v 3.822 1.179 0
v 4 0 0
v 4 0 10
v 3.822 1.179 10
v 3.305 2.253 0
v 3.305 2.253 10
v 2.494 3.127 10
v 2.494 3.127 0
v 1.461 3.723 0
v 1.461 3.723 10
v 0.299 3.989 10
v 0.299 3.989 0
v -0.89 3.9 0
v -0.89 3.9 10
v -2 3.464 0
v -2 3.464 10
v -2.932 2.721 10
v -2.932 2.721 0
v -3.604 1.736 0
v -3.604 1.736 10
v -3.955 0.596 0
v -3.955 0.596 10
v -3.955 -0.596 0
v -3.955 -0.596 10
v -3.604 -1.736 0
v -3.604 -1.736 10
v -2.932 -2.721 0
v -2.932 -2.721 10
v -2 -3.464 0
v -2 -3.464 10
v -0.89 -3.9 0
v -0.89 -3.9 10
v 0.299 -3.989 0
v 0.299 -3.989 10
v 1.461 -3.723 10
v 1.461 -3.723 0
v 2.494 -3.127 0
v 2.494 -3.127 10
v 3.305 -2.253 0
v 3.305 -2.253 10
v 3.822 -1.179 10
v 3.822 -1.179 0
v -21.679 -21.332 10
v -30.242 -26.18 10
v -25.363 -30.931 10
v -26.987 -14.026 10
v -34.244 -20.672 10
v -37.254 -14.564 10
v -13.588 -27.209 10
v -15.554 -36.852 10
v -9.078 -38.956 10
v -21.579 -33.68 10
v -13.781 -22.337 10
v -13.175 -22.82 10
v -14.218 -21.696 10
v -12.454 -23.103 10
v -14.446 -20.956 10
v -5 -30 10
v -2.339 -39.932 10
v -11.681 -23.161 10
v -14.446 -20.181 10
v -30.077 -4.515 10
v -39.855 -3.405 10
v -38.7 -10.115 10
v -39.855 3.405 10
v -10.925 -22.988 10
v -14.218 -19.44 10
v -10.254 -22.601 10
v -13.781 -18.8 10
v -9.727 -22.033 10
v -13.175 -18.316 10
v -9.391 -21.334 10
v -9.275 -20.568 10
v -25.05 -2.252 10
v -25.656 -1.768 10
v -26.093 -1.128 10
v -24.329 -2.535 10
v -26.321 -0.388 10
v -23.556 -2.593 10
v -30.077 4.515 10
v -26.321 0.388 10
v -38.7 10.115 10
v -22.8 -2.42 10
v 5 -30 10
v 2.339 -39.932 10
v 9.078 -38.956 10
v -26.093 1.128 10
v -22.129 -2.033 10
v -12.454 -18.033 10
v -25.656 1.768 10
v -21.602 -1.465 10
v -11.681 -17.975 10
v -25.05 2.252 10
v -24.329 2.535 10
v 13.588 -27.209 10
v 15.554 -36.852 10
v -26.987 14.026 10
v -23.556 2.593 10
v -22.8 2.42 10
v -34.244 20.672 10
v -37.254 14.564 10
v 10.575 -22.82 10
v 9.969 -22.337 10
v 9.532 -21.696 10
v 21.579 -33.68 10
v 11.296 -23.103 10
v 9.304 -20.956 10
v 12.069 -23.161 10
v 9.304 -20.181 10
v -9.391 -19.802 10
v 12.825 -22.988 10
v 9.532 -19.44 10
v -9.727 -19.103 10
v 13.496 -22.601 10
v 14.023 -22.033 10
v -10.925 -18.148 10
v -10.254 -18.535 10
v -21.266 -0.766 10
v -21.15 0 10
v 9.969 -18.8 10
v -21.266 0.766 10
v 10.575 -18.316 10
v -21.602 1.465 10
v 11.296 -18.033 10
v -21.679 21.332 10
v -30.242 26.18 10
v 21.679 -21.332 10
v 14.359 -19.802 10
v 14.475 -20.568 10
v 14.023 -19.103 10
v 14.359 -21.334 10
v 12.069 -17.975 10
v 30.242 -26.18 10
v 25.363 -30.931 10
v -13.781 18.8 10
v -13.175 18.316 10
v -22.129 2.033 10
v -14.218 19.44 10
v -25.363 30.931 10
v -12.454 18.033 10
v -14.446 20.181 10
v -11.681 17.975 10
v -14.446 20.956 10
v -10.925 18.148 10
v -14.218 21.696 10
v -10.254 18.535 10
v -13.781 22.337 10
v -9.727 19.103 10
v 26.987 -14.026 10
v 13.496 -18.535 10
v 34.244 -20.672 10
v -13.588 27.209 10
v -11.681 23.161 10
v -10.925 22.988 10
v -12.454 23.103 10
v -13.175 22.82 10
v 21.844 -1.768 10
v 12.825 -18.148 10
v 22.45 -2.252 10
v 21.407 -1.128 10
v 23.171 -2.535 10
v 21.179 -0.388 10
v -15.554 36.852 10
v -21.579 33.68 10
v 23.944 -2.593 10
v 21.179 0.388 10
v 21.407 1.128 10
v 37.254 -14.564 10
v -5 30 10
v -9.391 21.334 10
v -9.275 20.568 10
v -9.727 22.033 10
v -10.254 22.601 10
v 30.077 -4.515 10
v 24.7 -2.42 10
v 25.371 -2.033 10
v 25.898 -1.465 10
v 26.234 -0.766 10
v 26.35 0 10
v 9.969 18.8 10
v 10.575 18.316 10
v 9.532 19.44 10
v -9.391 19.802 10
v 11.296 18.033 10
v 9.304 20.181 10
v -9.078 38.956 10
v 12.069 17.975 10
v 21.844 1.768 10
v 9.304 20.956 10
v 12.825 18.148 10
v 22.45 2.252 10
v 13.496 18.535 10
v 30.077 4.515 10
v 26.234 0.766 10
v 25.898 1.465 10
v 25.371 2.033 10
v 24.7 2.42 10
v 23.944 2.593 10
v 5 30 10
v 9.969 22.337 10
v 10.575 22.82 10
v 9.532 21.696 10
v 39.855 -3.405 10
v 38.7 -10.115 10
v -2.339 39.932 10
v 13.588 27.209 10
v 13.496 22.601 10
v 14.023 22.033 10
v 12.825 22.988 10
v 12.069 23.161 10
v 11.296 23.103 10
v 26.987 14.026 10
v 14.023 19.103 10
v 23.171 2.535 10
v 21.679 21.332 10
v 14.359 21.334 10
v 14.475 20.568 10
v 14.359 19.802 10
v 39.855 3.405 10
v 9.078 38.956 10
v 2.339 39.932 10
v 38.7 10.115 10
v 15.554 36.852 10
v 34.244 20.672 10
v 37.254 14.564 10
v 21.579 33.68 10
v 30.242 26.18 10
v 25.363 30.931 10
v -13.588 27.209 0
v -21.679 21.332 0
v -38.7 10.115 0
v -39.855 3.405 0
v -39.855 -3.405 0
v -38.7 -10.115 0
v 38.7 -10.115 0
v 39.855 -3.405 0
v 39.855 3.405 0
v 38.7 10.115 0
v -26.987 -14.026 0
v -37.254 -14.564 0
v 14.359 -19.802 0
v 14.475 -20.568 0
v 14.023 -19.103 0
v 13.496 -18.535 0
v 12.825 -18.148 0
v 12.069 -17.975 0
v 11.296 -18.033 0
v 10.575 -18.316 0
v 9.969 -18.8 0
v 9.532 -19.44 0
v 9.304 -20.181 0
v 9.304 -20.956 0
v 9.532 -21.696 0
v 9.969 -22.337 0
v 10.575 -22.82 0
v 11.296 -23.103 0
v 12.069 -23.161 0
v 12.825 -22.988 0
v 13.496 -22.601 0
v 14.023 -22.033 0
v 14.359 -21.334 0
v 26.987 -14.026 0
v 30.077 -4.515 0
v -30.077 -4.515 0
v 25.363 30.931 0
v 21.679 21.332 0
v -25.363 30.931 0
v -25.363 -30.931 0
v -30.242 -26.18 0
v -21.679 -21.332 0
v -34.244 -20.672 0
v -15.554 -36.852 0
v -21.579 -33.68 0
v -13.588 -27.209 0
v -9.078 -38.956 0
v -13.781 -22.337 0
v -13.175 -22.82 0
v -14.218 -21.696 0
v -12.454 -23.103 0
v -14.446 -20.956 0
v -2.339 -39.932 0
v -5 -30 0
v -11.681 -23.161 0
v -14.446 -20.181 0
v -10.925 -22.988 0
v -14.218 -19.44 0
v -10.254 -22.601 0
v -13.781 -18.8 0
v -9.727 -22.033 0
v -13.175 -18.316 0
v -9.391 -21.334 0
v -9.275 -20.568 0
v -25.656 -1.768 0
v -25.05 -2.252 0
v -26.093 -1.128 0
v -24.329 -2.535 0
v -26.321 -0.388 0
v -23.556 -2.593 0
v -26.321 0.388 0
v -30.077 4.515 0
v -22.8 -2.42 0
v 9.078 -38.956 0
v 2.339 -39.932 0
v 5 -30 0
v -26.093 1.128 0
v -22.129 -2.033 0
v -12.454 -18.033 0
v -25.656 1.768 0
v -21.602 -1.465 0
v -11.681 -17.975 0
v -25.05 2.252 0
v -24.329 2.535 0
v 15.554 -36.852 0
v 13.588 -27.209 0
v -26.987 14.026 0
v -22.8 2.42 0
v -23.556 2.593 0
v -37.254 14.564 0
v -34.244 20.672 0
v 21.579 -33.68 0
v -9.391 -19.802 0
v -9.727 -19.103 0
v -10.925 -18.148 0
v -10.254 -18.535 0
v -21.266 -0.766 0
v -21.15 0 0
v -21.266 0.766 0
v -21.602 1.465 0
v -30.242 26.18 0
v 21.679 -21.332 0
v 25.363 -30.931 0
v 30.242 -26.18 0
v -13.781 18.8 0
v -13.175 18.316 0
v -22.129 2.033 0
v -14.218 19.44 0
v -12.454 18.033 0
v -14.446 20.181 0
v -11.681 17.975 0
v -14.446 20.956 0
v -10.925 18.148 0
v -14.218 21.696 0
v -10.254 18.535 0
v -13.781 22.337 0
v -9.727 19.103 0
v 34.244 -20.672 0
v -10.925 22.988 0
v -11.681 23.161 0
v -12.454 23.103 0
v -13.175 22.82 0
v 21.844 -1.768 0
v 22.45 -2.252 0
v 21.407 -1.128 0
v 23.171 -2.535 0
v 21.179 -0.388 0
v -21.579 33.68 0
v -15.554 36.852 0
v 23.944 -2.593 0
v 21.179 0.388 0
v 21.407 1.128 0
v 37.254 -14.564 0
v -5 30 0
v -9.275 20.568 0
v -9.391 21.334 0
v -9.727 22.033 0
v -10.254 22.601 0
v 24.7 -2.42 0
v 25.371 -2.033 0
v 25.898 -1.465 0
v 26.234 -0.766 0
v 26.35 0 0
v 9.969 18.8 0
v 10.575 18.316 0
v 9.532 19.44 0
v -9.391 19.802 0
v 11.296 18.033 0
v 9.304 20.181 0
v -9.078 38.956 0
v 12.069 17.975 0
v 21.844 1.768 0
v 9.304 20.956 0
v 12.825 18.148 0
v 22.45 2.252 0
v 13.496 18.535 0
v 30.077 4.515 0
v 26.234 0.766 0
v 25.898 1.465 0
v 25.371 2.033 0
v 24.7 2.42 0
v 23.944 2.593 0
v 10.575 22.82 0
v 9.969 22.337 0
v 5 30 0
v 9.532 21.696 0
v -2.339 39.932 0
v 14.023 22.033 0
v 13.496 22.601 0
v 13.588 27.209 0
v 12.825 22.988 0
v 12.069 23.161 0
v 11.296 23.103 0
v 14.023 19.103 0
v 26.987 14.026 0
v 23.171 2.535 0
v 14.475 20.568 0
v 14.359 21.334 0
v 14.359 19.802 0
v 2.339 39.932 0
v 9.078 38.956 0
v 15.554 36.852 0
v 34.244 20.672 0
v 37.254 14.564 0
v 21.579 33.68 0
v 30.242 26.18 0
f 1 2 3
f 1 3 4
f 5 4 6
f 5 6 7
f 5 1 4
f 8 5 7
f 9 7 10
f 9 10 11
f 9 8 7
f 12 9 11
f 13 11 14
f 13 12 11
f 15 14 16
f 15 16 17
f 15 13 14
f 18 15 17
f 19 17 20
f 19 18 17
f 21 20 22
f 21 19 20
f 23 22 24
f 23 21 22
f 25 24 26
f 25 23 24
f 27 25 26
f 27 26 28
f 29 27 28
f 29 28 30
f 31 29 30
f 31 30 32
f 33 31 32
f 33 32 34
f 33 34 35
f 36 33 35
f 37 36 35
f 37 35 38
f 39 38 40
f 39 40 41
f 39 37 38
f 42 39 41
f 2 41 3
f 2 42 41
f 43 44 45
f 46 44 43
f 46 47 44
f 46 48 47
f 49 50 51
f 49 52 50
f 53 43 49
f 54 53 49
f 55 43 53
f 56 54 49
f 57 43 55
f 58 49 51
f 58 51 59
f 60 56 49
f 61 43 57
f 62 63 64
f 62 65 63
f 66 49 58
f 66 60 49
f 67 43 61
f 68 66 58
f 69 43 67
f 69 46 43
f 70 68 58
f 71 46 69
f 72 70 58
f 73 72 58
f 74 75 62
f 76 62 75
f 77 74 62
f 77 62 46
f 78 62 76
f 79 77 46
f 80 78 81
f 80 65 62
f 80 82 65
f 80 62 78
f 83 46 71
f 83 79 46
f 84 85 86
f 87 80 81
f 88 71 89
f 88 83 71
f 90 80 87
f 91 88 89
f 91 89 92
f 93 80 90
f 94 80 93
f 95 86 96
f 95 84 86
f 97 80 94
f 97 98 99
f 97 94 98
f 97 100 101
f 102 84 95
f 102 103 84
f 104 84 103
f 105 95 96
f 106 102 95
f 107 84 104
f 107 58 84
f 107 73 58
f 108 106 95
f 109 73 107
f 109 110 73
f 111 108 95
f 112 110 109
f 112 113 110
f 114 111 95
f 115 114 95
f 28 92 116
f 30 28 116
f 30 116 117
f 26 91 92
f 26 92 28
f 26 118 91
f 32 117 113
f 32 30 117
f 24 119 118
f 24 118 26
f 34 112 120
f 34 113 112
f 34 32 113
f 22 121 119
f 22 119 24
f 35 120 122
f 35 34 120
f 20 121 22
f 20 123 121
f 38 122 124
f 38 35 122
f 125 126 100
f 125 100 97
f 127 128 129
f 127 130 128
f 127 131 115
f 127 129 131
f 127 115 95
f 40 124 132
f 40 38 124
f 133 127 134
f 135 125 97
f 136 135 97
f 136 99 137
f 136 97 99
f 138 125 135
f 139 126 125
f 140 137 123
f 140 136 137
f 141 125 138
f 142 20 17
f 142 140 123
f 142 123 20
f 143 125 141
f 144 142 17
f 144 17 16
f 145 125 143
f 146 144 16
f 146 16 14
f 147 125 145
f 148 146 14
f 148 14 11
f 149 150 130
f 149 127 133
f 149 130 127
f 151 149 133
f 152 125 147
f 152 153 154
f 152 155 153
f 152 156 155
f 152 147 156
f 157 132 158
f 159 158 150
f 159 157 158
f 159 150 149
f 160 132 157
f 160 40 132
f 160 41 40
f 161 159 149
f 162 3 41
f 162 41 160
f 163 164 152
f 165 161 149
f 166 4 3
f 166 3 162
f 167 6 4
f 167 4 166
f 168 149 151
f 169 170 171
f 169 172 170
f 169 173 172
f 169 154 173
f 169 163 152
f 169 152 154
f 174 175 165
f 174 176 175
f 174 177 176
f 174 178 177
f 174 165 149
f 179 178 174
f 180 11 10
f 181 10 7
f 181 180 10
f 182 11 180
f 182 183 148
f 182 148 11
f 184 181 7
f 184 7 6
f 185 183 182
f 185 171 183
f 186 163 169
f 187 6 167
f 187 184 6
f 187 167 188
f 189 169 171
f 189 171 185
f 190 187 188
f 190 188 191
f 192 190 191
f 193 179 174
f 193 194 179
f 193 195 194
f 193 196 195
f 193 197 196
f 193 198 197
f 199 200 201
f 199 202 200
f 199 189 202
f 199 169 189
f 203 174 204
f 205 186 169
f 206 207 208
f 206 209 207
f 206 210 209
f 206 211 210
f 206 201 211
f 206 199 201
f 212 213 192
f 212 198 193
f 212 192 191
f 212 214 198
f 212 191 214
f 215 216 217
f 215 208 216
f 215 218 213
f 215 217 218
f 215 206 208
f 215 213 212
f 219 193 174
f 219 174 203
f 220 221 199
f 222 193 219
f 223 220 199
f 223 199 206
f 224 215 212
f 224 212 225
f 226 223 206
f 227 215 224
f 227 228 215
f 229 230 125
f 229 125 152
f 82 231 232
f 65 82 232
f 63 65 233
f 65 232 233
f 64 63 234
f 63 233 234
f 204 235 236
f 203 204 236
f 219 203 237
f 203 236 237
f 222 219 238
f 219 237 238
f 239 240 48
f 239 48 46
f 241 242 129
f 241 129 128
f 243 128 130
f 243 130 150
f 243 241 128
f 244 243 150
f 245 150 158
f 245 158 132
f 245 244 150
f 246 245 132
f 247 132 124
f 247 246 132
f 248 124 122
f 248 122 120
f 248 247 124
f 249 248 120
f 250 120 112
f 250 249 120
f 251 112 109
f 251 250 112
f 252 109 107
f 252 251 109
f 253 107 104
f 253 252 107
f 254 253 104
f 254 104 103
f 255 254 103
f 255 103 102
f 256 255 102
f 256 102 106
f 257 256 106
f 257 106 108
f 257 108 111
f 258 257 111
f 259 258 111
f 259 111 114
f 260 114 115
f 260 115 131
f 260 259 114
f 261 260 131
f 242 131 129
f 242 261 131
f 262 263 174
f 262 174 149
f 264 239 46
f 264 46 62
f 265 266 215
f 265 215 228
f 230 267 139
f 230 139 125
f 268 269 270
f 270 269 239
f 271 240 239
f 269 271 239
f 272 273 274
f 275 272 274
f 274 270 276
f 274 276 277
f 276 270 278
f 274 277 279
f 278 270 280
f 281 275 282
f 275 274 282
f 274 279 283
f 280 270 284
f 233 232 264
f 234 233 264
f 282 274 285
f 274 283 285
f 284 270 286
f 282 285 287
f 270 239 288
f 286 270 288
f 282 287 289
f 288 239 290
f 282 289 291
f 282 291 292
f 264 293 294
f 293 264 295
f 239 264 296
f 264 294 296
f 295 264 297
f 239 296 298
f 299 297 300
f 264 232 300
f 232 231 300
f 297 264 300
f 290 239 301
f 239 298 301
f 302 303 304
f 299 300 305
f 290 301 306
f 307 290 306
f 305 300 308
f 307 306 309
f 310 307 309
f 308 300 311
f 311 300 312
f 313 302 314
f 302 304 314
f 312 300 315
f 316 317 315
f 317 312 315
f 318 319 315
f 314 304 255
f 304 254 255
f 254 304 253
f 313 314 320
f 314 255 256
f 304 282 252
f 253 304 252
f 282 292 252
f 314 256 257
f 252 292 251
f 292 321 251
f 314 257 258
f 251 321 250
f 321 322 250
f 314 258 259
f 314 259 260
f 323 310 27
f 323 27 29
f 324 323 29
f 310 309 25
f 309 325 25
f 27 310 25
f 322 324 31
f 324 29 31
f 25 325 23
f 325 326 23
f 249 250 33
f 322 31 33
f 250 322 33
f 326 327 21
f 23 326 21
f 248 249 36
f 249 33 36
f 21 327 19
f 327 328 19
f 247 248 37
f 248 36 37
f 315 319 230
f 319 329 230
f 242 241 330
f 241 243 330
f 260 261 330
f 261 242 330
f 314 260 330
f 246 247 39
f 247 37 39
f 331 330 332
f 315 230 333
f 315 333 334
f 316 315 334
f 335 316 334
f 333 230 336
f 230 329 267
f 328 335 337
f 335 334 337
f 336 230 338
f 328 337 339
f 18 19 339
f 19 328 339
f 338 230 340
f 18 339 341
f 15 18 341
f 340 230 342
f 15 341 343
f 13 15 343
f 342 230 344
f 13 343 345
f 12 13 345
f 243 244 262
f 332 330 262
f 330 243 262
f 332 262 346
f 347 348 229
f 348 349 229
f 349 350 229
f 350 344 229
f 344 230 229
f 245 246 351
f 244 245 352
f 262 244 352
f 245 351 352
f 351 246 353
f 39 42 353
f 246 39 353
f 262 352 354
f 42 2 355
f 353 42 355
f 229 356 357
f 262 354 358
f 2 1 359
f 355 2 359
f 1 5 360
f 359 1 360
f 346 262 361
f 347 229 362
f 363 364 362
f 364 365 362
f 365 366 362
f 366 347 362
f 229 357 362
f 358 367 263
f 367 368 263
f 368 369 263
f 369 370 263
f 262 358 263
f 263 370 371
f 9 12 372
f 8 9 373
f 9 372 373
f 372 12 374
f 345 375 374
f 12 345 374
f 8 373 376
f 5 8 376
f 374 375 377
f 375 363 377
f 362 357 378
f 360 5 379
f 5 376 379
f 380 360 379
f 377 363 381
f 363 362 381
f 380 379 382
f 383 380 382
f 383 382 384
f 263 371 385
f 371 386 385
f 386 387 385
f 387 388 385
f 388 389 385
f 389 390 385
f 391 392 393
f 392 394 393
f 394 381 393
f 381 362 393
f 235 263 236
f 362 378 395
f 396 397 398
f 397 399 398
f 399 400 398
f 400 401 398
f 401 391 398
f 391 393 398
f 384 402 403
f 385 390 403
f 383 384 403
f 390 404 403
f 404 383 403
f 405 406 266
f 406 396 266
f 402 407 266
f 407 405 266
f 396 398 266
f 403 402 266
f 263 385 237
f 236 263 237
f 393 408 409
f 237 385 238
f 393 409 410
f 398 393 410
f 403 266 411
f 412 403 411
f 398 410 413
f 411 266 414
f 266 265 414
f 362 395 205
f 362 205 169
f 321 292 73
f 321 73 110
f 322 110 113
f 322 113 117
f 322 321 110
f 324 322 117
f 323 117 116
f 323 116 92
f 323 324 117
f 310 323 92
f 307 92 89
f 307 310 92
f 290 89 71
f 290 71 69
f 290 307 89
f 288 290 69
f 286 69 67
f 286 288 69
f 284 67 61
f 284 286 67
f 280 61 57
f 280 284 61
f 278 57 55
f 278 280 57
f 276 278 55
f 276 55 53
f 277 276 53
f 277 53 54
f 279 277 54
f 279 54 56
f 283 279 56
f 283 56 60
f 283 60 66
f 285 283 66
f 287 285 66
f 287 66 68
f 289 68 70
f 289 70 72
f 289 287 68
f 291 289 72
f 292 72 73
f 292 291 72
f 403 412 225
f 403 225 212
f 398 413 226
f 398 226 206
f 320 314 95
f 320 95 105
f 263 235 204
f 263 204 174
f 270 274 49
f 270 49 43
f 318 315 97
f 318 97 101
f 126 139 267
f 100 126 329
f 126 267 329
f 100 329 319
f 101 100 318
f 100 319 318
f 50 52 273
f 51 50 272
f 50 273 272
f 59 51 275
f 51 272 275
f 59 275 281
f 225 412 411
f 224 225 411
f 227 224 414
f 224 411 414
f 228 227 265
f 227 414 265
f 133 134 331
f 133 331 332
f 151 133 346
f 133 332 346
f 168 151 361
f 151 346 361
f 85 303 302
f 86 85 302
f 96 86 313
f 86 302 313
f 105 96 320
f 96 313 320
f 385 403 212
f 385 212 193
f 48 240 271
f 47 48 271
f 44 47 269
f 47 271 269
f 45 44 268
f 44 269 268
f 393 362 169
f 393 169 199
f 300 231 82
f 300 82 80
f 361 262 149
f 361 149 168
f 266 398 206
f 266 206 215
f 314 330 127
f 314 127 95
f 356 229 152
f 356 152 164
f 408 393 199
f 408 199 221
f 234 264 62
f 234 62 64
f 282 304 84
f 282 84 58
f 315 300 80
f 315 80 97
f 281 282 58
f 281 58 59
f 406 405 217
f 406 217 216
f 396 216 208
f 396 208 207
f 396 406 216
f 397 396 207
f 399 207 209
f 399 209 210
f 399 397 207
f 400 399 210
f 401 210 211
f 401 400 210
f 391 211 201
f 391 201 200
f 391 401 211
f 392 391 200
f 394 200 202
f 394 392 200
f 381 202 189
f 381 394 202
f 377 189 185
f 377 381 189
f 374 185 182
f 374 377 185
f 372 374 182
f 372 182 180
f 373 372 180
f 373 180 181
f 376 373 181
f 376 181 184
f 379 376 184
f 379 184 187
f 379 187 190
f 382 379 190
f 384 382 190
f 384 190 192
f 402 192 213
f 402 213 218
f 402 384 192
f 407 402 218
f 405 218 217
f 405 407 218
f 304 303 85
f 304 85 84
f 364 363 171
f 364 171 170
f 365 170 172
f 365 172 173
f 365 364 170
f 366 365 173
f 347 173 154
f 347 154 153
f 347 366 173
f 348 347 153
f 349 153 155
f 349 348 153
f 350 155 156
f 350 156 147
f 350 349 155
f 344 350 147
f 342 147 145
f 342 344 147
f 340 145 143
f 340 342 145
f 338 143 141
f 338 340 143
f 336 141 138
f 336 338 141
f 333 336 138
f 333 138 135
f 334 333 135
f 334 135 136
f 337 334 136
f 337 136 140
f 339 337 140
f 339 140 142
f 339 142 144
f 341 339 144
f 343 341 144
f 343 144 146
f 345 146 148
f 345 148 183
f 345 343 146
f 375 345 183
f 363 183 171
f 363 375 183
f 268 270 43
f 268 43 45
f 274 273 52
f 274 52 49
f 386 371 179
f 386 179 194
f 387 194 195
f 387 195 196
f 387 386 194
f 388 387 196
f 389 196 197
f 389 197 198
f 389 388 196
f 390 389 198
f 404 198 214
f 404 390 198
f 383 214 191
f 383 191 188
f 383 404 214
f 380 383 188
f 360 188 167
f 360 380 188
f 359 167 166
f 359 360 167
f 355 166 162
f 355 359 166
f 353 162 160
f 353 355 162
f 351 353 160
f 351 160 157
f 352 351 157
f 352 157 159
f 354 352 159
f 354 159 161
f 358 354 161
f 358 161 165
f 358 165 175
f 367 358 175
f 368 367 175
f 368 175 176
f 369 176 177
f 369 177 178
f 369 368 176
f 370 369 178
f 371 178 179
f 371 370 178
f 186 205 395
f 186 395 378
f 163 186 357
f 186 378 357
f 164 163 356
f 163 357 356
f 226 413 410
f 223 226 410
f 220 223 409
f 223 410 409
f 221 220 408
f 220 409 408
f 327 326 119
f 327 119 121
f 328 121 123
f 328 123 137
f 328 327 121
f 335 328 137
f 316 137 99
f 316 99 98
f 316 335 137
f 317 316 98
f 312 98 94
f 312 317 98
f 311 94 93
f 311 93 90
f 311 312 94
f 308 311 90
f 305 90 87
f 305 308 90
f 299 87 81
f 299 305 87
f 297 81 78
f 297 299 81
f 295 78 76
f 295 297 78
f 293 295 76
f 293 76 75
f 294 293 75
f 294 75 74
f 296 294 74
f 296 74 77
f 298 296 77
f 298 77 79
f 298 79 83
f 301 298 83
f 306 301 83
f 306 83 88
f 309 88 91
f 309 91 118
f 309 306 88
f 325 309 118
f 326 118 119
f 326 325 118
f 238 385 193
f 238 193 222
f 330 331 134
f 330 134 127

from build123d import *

# Parameters (mm, degrees)
SKETCH1_R           = 40
SKETCH1_R_2         = 4
SKETCH1_R_3         = 2.6
BOSS_EXTRUDE1_DEPTH = 10
CUT_EXTRUDE1_START  = -11
CUT_EXTRUDE1_DEPTH  = 12
CIRPATTERN1_COUNT   = 10


with BuildPart() as part:
    # Sketch1 → Boss-Extrude1 (new body)
    with BuildSketch(Plane.XY):
        Circle(SKETCH1_R)
        Circle(SKETCH1_R_2, mode=Mode.SUBTRACT)
        with Locations((-23.75, 0)):
            Circle(SKETCH1_R_3, mode=Mode.SUBTRACT)
        with Locations((-11.875, 20.56810334)):
            Circle(SKETCH1_R_3, mode=Mode.SUBTRACT)
        with Locations((11.875, 20.56810334)):
            Circle(SKETCH1_R_3, mode=Mode.SUBTRACT)
        with Locations((23.75, 0)):
            Circle(SKETCH1_R_3, mode=Mode.SUBTRACT)
        with Locations((11.875, -20.56810334)):
            Circle(SKETCH1_R_3, mode=Mode.SUBTRACT)
        with Locations((-11.875, -20.56810334)):
            Circle(SKETCH1_R_3, mode=Mode.SUBTRACT)
    extrude(amount=BOSS_EXTRUDE1_DEPTH)

    # Sketch3 → Cut-Extrude1 (cut)
    with BuildSketch(Plane.XY.offset(10).offset(CUT_EXTRUDE1_START)):
        Polygon((47.070941398, 224.331398897), (-2.338845452, 39.931563981), (-5, 30), (5, 30), (2.338845452, 39.931563981), (-47.070941398, 224.331398897), (-47.070941398, -157.478114623), (47.070941398, -157.478114623), align=None)
    cut_extrude1 = extrude(amount=CUT_EXTRUDE1_DEPTH, mode=Mode.SUBTRACT)

    # CirPattern1: Cut-Extrude1 ×10 about axis
    cirpattern1_axis = Axis((0, 0, 10), (0, 0, 1))
    for i in range(1, CIRPATTERN1_COUNT):
        add(cut_extrude1.rotate(cirpattern1_axis, i * 360 / CIRPATTERN1_COUNT), mode=Mode.SUBTRACT)


solid = part.part
